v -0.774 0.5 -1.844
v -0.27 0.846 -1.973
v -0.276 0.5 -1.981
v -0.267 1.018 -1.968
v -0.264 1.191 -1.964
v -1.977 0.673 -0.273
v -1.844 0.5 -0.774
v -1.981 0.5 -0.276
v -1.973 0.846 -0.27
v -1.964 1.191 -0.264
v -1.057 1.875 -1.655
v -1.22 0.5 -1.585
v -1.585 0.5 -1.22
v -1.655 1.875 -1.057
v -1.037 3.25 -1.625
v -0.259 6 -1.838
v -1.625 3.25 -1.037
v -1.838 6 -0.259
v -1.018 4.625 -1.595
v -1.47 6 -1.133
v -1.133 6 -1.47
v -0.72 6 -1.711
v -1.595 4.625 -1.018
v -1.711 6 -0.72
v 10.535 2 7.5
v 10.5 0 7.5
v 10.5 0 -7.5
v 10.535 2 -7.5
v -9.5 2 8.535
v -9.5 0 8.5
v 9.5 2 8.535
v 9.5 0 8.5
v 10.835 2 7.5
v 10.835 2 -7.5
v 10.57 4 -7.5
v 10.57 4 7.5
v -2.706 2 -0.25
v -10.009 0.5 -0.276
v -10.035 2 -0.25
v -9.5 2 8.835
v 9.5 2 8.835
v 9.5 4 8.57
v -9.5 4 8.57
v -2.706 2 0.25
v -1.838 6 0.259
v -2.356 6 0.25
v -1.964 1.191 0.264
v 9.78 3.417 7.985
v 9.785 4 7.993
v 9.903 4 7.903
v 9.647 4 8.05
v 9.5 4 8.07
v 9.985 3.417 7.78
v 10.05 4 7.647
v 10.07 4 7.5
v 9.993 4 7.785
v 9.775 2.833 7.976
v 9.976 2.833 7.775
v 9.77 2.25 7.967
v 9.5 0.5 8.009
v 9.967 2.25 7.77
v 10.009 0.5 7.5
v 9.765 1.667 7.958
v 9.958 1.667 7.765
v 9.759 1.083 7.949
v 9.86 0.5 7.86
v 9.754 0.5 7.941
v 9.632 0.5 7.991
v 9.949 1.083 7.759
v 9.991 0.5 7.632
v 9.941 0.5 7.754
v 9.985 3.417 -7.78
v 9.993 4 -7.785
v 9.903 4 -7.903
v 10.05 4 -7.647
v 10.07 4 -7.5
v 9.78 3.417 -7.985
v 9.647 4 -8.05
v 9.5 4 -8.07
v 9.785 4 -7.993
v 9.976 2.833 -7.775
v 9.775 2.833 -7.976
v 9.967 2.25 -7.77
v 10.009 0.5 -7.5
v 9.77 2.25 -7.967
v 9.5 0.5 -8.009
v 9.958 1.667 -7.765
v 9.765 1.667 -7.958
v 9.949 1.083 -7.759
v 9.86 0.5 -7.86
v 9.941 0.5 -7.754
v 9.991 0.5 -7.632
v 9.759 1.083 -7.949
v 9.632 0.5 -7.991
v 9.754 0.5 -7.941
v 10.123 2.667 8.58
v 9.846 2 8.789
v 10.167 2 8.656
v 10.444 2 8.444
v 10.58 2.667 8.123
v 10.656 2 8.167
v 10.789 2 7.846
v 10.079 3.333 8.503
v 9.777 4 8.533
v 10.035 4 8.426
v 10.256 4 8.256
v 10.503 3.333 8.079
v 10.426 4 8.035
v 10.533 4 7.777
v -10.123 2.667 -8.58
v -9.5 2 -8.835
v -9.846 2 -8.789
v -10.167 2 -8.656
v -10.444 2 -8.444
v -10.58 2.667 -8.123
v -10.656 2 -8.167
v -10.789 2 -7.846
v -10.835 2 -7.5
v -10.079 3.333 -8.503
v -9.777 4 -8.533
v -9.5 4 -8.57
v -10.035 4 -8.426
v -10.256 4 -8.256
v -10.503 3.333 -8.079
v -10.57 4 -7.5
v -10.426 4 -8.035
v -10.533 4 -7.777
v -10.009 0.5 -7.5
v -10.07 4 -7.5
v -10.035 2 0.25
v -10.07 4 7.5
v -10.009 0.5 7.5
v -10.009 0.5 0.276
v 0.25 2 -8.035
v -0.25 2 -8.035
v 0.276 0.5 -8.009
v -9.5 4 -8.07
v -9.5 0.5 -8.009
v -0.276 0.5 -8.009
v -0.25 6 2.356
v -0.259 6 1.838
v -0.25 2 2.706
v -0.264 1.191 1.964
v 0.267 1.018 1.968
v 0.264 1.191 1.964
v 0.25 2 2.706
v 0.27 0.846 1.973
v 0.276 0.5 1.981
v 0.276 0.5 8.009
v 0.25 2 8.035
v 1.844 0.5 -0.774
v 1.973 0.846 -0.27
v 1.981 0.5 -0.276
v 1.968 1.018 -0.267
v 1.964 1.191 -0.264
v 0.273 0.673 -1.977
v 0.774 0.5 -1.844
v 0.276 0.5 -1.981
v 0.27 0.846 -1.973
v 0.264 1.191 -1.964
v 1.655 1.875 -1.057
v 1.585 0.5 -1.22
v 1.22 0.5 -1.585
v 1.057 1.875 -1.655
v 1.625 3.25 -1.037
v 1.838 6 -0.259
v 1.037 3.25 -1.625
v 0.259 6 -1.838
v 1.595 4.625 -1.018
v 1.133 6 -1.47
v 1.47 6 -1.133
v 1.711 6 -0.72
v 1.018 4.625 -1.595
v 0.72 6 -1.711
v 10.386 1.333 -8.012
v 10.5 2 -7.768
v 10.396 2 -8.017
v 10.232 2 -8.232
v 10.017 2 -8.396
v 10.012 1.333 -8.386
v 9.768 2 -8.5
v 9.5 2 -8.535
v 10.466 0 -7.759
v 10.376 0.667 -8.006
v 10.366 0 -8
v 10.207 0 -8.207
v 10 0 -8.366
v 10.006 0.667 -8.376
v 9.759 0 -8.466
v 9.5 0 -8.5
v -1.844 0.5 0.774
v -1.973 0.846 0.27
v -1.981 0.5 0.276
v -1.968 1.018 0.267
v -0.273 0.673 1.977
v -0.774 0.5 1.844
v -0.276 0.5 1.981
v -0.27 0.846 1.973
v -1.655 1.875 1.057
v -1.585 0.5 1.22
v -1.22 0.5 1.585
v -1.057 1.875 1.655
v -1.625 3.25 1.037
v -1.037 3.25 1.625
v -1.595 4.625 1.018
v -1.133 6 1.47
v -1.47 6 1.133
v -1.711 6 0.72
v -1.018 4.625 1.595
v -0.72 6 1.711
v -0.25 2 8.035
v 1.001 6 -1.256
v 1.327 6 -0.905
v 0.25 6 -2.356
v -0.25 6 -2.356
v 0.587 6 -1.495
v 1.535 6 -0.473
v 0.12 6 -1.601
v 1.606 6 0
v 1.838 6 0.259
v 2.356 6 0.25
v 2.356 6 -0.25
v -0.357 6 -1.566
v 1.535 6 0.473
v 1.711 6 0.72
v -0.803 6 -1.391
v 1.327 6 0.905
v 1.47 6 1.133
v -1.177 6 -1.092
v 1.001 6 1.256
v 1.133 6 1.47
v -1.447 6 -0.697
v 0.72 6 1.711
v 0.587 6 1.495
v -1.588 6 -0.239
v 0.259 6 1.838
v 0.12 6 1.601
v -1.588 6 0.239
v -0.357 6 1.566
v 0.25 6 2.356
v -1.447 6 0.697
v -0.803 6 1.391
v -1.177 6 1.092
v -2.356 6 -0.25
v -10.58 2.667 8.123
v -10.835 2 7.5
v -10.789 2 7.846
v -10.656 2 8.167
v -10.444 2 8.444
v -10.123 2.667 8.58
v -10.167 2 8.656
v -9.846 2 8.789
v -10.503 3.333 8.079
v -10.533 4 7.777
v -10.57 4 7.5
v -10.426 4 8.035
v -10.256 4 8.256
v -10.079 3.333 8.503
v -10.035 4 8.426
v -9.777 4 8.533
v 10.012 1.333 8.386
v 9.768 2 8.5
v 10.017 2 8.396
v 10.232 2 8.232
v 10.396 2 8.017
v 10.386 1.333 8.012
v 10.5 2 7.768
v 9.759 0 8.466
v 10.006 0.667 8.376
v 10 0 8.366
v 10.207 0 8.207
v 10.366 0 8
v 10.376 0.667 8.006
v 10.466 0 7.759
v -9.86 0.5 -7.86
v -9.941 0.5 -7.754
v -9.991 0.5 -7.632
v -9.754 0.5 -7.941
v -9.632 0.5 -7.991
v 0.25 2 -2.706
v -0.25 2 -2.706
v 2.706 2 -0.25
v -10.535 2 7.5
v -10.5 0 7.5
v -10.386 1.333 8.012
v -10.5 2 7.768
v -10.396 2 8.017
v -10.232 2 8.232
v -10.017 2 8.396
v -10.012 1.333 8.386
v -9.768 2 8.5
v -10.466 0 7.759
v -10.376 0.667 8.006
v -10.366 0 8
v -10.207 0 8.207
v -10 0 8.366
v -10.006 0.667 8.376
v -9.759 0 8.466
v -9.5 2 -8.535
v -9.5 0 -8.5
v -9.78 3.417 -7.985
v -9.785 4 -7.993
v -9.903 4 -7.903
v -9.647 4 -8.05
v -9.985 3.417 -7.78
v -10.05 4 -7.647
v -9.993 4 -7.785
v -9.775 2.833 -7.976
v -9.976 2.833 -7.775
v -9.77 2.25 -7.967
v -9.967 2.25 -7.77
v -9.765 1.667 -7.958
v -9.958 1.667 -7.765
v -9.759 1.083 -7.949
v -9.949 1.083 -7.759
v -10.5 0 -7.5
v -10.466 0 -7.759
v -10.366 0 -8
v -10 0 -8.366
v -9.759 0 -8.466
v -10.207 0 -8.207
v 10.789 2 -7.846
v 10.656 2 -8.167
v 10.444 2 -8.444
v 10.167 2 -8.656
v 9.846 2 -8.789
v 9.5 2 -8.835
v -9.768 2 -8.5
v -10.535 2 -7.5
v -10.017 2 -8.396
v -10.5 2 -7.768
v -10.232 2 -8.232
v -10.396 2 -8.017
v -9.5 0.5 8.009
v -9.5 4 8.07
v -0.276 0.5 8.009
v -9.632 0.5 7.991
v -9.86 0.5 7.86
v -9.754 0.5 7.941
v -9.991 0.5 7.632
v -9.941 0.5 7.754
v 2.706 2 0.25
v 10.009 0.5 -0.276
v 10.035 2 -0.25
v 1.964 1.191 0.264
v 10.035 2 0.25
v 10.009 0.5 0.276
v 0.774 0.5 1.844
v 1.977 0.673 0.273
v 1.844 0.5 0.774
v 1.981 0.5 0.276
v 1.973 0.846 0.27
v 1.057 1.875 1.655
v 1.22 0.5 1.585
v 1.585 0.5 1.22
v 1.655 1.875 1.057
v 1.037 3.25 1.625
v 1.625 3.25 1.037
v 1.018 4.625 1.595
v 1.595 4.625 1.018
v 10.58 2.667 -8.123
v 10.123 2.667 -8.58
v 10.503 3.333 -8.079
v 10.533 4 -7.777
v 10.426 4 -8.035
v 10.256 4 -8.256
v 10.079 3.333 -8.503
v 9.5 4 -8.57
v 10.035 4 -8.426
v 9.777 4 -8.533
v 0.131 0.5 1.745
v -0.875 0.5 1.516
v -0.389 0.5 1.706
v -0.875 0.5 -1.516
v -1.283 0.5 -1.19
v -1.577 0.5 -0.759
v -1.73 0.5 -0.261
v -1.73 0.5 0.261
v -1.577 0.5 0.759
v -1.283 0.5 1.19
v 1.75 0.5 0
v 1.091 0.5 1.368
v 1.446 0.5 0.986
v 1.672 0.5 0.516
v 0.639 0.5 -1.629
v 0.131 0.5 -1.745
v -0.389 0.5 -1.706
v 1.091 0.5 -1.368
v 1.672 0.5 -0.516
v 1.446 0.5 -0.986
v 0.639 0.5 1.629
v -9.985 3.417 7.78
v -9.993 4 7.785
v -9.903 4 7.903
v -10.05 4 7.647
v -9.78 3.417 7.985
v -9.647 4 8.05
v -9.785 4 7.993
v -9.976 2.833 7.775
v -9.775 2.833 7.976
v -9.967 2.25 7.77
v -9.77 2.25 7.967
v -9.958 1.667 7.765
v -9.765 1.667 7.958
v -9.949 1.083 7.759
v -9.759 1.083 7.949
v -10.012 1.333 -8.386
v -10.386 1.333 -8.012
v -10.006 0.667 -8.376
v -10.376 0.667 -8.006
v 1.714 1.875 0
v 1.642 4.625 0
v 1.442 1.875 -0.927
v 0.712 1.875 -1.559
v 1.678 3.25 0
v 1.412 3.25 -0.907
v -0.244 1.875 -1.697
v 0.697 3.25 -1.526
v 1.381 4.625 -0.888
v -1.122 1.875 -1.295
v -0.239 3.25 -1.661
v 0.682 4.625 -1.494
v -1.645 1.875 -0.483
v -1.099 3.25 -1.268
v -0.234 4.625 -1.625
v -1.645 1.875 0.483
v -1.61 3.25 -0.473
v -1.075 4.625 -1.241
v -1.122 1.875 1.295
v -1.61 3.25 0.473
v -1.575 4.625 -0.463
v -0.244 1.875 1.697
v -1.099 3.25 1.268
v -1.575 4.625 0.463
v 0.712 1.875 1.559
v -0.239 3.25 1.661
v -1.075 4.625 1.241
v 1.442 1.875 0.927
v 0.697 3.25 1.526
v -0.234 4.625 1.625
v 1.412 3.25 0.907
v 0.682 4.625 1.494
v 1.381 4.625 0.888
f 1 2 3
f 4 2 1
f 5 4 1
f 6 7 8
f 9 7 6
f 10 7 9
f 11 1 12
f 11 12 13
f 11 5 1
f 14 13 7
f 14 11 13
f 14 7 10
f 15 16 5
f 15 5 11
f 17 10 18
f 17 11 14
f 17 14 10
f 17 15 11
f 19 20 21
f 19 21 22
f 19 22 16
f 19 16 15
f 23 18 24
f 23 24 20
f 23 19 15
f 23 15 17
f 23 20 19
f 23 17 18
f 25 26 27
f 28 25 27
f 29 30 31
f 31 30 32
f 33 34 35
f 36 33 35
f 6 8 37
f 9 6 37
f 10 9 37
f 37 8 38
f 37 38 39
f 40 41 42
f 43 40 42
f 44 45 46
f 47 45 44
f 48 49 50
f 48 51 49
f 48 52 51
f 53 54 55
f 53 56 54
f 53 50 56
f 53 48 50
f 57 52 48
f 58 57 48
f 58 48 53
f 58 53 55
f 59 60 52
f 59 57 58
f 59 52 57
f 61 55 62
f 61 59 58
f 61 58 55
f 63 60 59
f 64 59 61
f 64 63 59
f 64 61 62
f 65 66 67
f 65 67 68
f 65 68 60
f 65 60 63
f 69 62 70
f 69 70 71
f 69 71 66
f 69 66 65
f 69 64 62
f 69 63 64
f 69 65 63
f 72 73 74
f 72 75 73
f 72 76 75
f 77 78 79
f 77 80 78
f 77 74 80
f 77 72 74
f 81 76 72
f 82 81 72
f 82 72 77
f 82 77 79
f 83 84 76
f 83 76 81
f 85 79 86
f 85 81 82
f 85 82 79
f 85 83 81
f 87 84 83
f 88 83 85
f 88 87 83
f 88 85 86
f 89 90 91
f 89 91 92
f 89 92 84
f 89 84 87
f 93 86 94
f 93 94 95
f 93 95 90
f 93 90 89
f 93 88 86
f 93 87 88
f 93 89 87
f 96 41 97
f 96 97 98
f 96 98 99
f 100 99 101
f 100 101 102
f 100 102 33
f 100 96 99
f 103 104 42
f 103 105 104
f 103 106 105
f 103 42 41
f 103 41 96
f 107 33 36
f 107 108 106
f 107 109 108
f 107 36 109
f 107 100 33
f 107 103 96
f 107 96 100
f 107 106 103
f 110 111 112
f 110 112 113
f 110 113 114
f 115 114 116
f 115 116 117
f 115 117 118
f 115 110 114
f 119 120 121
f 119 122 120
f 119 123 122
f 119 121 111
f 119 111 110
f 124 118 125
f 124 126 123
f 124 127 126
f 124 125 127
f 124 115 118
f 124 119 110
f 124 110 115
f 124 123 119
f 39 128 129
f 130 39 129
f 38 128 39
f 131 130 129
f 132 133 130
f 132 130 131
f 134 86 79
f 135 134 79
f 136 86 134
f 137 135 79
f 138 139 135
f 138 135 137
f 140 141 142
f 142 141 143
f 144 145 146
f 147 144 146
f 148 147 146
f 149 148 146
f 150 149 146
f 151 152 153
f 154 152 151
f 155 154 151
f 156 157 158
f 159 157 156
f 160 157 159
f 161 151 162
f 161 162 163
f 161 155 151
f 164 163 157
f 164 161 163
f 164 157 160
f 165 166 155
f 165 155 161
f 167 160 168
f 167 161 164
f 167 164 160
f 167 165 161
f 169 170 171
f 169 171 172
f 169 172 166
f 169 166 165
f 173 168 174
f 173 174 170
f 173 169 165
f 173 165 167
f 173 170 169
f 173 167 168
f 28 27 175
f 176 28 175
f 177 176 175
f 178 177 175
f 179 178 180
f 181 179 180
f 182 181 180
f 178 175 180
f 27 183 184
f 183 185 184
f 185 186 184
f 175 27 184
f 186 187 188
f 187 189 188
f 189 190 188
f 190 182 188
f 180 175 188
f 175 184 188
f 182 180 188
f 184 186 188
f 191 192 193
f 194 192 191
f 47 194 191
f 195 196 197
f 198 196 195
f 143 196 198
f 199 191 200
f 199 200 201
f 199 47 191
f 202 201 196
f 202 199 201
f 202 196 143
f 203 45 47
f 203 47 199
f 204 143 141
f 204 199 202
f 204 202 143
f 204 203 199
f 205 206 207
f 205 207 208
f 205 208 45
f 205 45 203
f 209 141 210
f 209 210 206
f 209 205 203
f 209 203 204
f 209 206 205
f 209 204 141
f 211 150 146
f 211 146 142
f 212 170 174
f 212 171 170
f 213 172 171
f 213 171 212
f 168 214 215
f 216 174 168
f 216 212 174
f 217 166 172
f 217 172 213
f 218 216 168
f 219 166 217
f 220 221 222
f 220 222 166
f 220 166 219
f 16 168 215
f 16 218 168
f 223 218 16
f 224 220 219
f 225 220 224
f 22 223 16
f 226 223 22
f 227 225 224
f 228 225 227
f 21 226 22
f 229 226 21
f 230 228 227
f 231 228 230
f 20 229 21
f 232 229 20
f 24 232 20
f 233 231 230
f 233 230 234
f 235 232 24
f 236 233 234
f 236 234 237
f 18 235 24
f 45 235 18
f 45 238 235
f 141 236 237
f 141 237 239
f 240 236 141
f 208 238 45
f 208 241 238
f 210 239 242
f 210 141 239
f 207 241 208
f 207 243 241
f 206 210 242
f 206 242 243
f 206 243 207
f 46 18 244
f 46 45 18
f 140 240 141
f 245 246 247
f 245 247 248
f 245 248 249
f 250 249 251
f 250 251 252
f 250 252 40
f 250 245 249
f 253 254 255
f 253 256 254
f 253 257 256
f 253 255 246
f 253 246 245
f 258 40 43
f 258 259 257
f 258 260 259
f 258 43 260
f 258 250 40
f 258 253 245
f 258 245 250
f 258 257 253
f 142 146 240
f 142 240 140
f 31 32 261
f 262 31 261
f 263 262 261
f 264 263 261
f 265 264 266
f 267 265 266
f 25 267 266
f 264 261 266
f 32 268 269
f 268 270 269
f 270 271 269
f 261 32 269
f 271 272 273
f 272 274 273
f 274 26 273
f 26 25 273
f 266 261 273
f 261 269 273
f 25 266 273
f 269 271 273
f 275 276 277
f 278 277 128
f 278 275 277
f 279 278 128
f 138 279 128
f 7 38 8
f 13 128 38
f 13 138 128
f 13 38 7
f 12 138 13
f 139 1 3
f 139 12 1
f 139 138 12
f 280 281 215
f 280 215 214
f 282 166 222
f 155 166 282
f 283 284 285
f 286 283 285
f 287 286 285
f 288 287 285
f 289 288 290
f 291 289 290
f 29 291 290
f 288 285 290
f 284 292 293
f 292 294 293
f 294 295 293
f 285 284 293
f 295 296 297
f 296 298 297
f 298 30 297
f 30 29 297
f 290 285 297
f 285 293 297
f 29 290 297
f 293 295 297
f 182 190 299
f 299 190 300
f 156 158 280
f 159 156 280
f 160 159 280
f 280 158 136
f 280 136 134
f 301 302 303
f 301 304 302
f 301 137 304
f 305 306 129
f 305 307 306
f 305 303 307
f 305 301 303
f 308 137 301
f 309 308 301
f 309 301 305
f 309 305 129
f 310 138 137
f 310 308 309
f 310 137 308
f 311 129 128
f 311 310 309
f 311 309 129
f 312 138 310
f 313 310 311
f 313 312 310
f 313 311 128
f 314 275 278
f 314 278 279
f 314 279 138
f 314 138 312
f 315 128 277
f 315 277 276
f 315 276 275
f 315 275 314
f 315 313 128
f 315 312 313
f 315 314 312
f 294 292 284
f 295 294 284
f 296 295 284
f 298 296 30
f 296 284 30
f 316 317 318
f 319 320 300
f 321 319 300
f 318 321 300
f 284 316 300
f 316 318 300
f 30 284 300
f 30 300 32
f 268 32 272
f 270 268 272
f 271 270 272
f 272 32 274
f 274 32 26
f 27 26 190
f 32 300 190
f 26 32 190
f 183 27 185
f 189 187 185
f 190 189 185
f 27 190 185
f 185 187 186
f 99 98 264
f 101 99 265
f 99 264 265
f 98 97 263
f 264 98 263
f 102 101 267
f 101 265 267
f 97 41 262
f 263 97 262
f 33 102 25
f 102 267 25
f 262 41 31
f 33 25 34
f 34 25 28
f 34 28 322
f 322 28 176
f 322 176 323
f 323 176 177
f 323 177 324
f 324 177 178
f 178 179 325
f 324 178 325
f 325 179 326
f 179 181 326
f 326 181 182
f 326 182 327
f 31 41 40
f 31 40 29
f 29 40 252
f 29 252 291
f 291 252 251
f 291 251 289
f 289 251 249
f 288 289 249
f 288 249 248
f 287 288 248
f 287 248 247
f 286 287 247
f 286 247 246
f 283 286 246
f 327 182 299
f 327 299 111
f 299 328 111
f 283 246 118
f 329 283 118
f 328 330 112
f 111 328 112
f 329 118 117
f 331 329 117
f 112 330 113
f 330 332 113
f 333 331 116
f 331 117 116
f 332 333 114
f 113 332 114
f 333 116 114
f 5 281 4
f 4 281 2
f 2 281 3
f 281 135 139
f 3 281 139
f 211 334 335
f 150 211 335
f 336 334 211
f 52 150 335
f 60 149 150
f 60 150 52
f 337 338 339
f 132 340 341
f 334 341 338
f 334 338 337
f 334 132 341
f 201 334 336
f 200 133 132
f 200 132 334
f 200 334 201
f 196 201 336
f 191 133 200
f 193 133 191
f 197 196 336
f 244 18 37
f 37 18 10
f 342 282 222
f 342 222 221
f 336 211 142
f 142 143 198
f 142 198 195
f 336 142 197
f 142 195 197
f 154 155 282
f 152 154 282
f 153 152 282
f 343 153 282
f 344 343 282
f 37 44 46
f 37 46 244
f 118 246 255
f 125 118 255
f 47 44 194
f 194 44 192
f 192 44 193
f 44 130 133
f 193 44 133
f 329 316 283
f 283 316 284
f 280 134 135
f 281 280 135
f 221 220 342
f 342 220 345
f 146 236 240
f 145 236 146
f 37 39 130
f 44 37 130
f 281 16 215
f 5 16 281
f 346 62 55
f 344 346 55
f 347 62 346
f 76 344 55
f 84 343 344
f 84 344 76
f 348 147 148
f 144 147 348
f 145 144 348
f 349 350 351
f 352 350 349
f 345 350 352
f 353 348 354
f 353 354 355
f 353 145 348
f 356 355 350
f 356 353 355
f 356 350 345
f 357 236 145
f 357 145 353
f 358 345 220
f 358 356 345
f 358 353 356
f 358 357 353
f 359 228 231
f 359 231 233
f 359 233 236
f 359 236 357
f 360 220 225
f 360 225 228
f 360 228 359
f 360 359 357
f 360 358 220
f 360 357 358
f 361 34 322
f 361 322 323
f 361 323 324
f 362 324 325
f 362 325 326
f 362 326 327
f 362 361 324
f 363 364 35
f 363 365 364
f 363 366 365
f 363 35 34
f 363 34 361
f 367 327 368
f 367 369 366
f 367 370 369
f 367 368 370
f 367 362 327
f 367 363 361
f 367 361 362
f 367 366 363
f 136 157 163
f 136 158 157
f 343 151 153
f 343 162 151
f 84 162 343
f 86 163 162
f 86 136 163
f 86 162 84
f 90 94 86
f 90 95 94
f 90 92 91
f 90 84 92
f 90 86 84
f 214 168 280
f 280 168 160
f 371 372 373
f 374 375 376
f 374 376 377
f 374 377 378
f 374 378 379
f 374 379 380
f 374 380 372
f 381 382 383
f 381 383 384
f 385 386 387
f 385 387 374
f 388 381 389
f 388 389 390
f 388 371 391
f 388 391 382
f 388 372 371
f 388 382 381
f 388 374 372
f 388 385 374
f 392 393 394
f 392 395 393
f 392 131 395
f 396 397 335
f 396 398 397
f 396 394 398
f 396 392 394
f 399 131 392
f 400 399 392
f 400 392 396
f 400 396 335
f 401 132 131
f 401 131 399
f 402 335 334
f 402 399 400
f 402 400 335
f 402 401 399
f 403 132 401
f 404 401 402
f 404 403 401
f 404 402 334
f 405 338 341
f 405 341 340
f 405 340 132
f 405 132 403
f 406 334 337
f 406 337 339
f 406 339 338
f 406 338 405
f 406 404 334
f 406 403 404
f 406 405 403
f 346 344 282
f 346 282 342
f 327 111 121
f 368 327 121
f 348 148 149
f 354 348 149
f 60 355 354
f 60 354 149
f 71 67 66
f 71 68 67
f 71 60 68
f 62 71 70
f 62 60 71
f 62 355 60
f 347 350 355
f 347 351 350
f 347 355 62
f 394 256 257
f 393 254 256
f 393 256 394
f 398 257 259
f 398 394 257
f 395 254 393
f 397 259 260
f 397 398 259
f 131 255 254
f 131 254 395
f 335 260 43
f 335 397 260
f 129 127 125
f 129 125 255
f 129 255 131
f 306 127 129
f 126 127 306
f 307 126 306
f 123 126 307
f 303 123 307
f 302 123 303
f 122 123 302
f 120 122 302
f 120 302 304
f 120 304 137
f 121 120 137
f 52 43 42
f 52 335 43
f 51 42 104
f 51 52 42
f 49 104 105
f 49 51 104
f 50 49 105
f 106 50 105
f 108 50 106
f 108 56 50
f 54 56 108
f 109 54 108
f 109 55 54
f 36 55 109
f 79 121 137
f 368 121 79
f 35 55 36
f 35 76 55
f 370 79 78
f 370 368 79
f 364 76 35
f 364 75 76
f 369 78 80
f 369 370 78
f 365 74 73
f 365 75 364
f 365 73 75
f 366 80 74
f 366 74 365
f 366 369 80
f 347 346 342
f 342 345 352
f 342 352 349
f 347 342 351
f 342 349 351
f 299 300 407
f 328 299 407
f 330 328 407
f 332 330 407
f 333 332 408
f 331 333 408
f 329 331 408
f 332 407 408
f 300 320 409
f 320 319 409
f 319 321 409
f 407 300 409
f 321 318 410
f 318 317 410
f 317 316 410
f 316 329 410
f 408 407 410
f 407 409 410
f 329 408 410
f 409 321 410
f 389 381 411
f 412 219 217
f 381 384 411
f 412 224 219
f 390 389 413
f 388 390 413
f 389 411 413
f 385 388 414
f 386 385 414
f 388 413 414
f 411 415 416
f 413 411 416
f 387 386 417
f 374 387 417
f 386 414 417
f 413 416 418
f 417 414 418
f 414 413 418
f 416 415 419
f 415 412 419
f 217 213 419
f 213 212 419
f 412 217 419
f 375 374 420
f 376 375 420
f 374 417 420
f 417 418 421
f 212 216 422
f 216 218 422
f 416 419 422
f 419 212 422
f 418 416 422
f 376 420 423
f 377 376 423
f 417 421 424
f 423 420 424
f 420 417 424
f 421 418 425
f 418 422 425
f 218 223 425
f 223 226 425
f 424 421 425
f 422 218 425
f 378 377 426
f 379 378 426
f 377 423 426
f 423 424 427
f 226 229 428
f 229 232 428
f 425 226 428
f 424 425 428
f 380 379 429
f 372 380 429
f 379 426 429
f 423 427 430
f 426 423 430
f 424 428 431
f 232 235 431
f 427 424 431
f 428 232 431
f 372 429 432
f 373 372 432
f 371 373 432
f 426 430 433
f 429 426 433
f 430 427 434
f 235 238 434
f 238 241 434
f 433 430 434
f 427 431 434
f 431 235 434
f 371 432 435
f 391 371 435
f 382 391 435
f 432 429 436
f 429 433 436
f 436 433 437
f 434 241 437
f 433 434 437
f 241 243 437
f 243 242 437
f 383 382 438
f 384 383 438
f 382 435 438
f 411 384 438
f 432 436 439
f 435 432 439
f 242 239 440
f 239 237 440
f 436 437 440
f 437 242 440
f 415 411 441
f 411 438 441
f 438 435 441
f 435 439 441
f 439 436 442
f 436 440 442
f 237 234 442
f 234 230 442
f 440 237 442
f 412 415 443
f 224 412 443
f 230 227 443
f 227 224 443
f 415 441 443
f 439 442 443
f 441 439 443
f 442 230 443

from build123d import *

# Parameters (mm, degrees)
BOSS_EXTRUDE1_DEPTH = 4
BOSS_EXTRUDE1_DRAFT = -1
SHELL1_T            = -0.5
SKETCH2_R           = 2
BOSS_EXTRUDE2_DEPTH = 5.5
BOSS_EXTRUDE2_TAPER = 1.5
CIRPATTERN1_COUNT   = 4
SKETCH4_R           = 1.605977431
CUT_EXTRUDE1_DEPTH  = 5.5
CUT_EXTRUDE1_DRAFT  = 1.5
RIB2_START          = -10.069744096
RIB2_DEPTH          = 8.231928651
RIB2_START_2        = 1.837815445
RIB2_2_DEPTH        = 8.231928651
RIB2_START_3        = -8.069744096
RIB2_3_DEPTH        = 6.231928651
RIB2_4_DEPTH        = 6.231928651


with BuildPart() as part:
    # Sketch1 → Boss-Extrude1 (with draft: the straight prism first)
    with BuildSketch(Plane(origin=(0, 0, 0), x_dir=(1, 0, 0), z_dir=(0, 1, 0))):
        with BuildLine():
            Line((-9.5, -8.5), (9.5, -8.5))
            ThreePointArc((9.5, -8.5), (10.207106781, -8.207106781), (10.5, -7.5))
            Line((10.5, -7.5), (10.5, 7.5))
            ThreePointArc((10.5, 7.5), (10.207106781, 8.207106781), (9.5, 8.5))
            Line((9.5, 8.5), (-9.5, 8.5))
            ThreePointArc((-9.5, 8.5), (-10.207106781, 8.207106781), (-10.5, 7.5))
            Line((-10.5, 7.5), (-10.5, -7.5))
            ThreePointArc((-10.5, -7.5), (-10.207106781, -8.207106781), (-9.5, -8.5))
        make_face()
    extrude(amount=BOSS_EXTRUDE1_DEPTH)
    # Boss-Extrude1: the draft: its side faces are tilted about the plane it starts from
    boss_extrude1_sides = [part.faces().sort_by_distance(p)[0] for p in [
        (0, 2, 8.5),
        (10.207106781, 2, 8.207106781),
        (10.5, 2, 0),
        (10.207106781, 2, -8.207106781),
        (0, 2, -8.5),
        (-10.207106781, 2, -8.207106781),
        (-10.5, 2, 0),
        (-10.207106781, 2, 8.207106781),
    ]]
    draft(boss_extrude1_sides, Plane(origin=(0, 0, 0), x_dir=(1, 0, 0), z_dir=(0, 1, 0)), BOSS_EXTRUDE1_DRAFT)

    # Shell1
    shell1_openings = [part.faces().sort_by_distance(p)[0] for p in [
        (0, 4, 0),
    ]]
    offset(amount=SHELL1_T, openings=shell1_openings, kind=Kind.INTERSECTION)

    # Sketch2 → Boss-Extrude2 (add)
    with BuildSketch(Plane(origin=(0, 0.5, 0), x_dir=(1, 0, 0), z_dir=(0, 1, 0))):
        Circle(SKETCH2_R)
    extrude(amount=BOSS_EXTRUDE2_DEPTH, taper=BOSS_EXTRUDE2_TAPER)

    # Rib1: read off the stored shape, not the designer's step
    # Rib1: loft between two sections, ruled curve by curve
    rib1_from = [
        Edge.make_line((1.837815545, 6, 0.259010132), (2.355977431, 6, 0.25)),
        Edge.make_line((1.837815545, 6, -0.259010132), (2.355977431, 6, -0.25)),
        Edge.make_line((2.355977431, 6, -0.25), (2.355977431, 6, 0.25)),
        Edge.make_line((1.837815545, 6, -0.259010132), (1.837815545, 6, 0.259010132)),
    ]
    rib1_to = [
        Edge.make_line((1.982384256, 0.5, 0.264863479), (2.837165081, 0.5, 0.25)),
        Edge.make_line((1.982384256, 0.5, -0.264863479), (2.837165081, 0.5, -0.25)),
        Edge.make_line((2.837165081, 0.5, -0.25), (2.837165081, 0.5, 0.25)),
        Edge.make_line((1.982384256, 0.5, -0.264863479), (1.982384256, 0.5, 0.264863479)),
    ]
    rib1 = Solid(Shell([*[Face.make_surface_from_curves(rib1_from[k], rib1_to[k]) for k in range(4)], Face(Wire(rib1_from)), Face(Wire(rib1_to))]))
    add(rib1)

    # CirPattern1: Rib1 ×4 about axis
    cirpattern1_axis = Axis((0, 0, 0), (0, 1, 0))
    for i in range(1, CIRPATTERN1_COUNT):
        add(rib1.rotate(cirpattern1_axis, i * 360 / CIRPATTERN1_COUNT))


with BuildPart() as cut_extrude1_tool:
    # Sketch4 → Cut-Extrude1 (with draft: the straight prism first)
    with BuildSketch(Plane(origin=(0, 6, 0), x_dir=(1, 0, 0), z_dir=(0, 1, 0))):
        Circle(SKETCH4_R)
    extrude(amount=-CUT_EXTRUDE1_DEPTH)
    # Cut-Extrude1: the draft: its side faces are tilted about the plane it starts from
    cut_extrude1_sides = [cut_extrude1_tool.faces().sort_by_distance(p)[0] for p in [
        (-1.605977431, 3.25, 0),
    ]]
    draft(cut_extrude1_sides, Plane(origin=(0, 6, 0), x_dir=(1, 0, 0), z_dir=(0, 1, 0)), CUT_EXTRUDE1_DRAFT)


with BuildPart() as part_1:
    add(part.part)

    # Cut-Extrude1: cut by cut_extrude1_tool
    add(cut_extrude1_tool.part, mode=Mode.SUBTRACT)

    # Sweep1: sweep along a path in Sketch6
    with BuildLine(Plane(origin=(0, 2, 0), x_dir=(-1, 0, 0), z_dir=(0, -1, 0))) as sweep1_path:
        Line((-9.5, 8.56982026), (9.5, 8.56982026))
        ThreePointArc((9.5, 8.56982026), (10.25647716, 8.25647716), (10.56982026, 7.5))
        Line((10.56982026, 7.5), (10.56982026, -7.5))
        ThreePointArc((10.56982026, -7.5), (10.25647716, -8.25647716), (9.5, -8.56982026))
        Line((9.5, -8.56982026), (-9.5, -8.56982026))
        ThreePointArc((-9.5, -8.56982026), (-10.25647716, -8.25647716), (-10.56982026, -7.5))
        Line((-10.56982026, -7.5), (-10.56982026, 7.5))
        ThreePointArc((-10.56982026, 7.5), (-10.25647716, 8.25647716), (-9.5, 8.56982026))
    # Sketch5 → Sweep1 (sweep)
    with BuildSketch(Plane.XY):
        Polygon((10.56982026, 4), (10.53491013, 2), (10.83491013, 2), align=None)
    sweep(path=sweep1_path.line)

    # Rib2: read off the stored shape, not the designer's step
    # Rib2 outline → Rib2 (add)
    with BuildSketch(Plane.YZ.offset(RIB2_START)):
        Polygon((2, 0.25), (0.5, 0.276182597), (0.5, -0.276182597), (2, -0.25), align=None)
    extrude(amount=RIB2_DEPTH)

    # Rib2 2 outline → Rib2 2 (add)
    with BuildSketch(Plane.YZ.offset(RIB2_START_2)):
        Polygon((2, 0.25), (0.5, 0.276182597), (0.5, -0.276182597), (2, -0.25), align=None)
    extrude(amount=RIB2_2_DEPTH)

    # Rib2 3 outline → Rib2 3 (add)
    with BuildSketch(Plane.XY.offset(RIB2_START_3)):
        Polygon((0.276182597, 0.5), (0.25, 2), (-0.25, 2), (-0.276182597, 0.5), align=None)
    extrude(amount=RIB2_3_DEPTH)

    # Rib2 4 outline → Rib2 4 (add)
    with BuildSketch(Plane.XY.offset(RIB2_START_2)):
        Polygon((0.276182597, 0.5), (0.25, 2), (-0.25, 2), (-0.276182597, 0.5), align=None)
    extrude(amount=RIB2_4_DEPTH)


solid = part_1.part
